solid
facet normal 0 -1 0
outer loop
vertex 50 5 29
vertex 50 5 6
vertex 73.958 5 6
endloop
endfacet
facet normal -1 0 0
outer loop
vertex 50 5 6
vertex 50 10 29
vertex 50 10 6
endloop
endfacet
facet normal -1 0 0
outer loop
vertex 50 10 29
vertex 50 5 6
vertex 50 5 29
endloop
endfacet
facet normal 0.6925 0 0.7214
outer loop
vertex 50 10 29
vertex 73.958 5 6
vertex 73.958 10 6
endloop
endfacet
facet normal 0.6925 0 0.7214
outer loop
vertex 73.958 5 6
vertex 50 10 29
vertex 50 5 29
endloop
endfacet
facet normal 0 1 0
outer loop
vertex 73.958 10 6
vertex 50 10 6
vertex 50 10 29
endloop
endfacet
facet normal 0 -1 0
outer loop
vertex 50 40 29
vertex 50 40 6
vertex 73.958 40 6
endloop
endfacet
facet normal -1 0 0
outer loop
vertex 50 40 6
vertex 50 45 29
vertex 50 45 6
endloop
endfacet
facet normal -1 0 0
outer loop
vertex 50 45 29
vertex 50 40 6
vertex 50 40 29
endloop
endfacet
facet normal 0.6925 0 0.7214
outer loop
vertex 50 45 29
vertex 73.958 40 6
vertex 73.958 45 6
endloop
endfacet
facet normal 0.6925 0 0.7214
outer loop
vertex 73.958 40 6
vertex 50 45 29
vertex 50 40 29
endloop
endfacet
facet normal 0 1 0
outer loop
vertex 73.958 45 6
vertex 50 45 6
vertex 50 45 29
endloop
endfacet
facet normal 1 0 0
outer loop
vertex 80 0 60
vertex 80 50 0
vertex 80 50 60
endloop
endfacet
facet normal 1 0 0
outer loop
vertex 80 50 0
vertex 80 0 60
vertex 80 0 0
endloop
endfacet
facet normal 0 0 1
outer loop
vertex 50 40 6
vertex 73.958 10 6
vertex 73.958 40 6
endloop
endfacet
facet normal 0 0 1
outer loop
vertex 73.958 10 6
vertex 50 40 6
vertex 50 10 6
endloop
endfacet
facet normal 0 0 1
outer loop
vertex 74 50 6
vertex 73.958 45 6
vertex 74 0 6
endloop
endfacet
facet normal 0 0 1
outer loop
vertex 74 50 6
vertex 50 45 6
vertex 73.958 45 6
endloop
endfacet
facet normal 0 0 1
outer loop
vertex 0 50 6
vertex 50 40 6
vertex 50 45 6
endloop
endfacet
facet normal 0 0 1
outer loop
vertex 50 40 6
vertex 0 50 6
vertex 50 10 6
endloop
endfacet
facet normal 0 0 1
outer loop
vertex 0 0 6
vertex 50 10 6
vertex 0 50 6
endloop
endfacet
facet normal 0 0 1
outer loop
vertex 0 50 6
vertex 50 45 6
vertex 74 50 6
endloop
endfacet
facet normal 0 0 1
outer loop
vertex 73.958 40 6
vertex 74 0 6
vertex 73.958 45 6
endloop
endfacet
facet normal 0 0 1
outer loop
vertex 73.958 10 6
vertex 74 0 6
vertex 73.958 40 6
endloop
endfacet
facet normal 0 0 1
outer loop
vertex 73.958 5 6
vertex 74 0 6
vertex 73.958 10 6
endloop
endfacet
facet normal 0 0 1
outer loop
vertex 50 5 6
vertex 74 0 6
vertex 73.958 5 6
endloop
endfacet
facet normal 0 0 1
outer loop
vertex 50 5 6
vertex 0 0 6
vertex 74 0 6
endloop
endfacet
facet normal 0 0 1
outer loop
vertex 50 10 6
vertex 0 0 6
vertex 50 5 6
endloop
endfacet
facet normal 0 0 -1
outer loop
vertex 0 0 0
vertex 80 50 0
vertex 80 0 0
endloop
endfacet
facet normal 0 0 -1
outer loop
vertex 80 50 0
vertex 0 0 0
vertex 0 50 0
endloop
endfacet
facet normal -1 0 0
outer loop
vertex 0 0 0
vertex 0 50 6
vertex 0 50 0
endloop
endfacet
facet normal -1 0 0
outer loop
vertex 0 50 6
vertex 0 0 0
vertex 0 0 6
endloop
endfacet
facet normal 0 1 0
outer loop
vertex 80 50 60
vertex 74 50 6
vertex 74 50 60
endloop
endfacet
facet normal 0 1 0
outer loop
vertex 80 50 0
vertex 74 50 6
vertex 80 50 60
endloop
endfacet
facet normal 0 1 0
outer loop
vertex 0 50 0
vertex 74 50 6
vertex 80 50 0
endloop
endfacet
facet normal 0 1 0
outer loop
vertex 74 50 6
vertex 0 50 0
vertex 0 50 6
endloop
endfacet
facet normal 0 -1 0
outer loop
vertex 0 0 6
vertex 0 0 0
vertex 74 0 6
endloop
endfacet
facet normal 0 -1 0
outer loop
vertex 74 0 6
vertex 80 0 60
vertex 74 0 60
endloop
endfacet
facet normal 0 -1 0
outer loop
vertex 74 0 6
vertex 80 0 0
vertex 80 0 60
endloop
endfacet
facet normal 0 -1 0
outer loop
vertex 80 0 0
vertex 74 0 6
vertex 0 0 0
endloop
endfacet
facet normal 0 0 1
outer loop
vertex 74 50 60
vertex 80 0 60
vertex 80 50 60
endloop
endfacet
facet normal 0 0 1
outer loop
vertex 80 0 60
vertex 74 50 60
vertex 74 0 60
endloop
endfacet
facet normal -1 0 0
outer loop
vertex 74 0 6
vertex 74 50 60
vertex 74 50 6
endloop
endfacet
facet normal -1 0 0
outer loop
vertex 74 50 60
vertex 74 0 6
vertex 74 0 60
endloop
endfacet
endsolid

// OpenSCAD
$fn = 32;

// ----------------------------------------------------------------------
// Rib bracket: 2-gusset L bracket
// ----------------------------------------------------------------------

// --- parameters (mm) ---
base_l = 80;              // foot length, X
base_w = 50;              // foot width, Y
base_t = 6;               // foot thickness
plate_t = 6;              // upright plate thickness
plate_h = 60;             // overall height
gus_l = 24;               // gusset leg along the foot
gus_h = 24;               // gusset height
gus_t = 5;                // gusset thickness
gus_edge = 5;             // gusset margin from the foot edge
n_gus = 2;                // gusset count
fit_tol = 0.05;           // tolerance for press fits, mm
free_tol = 0.2;           // tolerance for clearance fits, mm

gus_pitch = (base_w - 2 * gus_edge - gus_t) / (n_gus - 1);  // gusset pitch

union() {
  cube([base_l, base_w, base_t]);
  translate([base_l - plate_t, 0, base_t - 1])
    cube([plate_t, base_w, plate_h - base_t + 1]);
  for (i = [0 : n_gus - 1])
    translate([base_l - plate_t - gus_l, gus_edge + i * gus_pitch, base_t - 1])
      rotate([-90, 0, 0])
        linear_extrude(height = gus_t)
          polygon(points = [[0, 0], [gus_l + 1, 0], [0, -gus_h]]);
}
